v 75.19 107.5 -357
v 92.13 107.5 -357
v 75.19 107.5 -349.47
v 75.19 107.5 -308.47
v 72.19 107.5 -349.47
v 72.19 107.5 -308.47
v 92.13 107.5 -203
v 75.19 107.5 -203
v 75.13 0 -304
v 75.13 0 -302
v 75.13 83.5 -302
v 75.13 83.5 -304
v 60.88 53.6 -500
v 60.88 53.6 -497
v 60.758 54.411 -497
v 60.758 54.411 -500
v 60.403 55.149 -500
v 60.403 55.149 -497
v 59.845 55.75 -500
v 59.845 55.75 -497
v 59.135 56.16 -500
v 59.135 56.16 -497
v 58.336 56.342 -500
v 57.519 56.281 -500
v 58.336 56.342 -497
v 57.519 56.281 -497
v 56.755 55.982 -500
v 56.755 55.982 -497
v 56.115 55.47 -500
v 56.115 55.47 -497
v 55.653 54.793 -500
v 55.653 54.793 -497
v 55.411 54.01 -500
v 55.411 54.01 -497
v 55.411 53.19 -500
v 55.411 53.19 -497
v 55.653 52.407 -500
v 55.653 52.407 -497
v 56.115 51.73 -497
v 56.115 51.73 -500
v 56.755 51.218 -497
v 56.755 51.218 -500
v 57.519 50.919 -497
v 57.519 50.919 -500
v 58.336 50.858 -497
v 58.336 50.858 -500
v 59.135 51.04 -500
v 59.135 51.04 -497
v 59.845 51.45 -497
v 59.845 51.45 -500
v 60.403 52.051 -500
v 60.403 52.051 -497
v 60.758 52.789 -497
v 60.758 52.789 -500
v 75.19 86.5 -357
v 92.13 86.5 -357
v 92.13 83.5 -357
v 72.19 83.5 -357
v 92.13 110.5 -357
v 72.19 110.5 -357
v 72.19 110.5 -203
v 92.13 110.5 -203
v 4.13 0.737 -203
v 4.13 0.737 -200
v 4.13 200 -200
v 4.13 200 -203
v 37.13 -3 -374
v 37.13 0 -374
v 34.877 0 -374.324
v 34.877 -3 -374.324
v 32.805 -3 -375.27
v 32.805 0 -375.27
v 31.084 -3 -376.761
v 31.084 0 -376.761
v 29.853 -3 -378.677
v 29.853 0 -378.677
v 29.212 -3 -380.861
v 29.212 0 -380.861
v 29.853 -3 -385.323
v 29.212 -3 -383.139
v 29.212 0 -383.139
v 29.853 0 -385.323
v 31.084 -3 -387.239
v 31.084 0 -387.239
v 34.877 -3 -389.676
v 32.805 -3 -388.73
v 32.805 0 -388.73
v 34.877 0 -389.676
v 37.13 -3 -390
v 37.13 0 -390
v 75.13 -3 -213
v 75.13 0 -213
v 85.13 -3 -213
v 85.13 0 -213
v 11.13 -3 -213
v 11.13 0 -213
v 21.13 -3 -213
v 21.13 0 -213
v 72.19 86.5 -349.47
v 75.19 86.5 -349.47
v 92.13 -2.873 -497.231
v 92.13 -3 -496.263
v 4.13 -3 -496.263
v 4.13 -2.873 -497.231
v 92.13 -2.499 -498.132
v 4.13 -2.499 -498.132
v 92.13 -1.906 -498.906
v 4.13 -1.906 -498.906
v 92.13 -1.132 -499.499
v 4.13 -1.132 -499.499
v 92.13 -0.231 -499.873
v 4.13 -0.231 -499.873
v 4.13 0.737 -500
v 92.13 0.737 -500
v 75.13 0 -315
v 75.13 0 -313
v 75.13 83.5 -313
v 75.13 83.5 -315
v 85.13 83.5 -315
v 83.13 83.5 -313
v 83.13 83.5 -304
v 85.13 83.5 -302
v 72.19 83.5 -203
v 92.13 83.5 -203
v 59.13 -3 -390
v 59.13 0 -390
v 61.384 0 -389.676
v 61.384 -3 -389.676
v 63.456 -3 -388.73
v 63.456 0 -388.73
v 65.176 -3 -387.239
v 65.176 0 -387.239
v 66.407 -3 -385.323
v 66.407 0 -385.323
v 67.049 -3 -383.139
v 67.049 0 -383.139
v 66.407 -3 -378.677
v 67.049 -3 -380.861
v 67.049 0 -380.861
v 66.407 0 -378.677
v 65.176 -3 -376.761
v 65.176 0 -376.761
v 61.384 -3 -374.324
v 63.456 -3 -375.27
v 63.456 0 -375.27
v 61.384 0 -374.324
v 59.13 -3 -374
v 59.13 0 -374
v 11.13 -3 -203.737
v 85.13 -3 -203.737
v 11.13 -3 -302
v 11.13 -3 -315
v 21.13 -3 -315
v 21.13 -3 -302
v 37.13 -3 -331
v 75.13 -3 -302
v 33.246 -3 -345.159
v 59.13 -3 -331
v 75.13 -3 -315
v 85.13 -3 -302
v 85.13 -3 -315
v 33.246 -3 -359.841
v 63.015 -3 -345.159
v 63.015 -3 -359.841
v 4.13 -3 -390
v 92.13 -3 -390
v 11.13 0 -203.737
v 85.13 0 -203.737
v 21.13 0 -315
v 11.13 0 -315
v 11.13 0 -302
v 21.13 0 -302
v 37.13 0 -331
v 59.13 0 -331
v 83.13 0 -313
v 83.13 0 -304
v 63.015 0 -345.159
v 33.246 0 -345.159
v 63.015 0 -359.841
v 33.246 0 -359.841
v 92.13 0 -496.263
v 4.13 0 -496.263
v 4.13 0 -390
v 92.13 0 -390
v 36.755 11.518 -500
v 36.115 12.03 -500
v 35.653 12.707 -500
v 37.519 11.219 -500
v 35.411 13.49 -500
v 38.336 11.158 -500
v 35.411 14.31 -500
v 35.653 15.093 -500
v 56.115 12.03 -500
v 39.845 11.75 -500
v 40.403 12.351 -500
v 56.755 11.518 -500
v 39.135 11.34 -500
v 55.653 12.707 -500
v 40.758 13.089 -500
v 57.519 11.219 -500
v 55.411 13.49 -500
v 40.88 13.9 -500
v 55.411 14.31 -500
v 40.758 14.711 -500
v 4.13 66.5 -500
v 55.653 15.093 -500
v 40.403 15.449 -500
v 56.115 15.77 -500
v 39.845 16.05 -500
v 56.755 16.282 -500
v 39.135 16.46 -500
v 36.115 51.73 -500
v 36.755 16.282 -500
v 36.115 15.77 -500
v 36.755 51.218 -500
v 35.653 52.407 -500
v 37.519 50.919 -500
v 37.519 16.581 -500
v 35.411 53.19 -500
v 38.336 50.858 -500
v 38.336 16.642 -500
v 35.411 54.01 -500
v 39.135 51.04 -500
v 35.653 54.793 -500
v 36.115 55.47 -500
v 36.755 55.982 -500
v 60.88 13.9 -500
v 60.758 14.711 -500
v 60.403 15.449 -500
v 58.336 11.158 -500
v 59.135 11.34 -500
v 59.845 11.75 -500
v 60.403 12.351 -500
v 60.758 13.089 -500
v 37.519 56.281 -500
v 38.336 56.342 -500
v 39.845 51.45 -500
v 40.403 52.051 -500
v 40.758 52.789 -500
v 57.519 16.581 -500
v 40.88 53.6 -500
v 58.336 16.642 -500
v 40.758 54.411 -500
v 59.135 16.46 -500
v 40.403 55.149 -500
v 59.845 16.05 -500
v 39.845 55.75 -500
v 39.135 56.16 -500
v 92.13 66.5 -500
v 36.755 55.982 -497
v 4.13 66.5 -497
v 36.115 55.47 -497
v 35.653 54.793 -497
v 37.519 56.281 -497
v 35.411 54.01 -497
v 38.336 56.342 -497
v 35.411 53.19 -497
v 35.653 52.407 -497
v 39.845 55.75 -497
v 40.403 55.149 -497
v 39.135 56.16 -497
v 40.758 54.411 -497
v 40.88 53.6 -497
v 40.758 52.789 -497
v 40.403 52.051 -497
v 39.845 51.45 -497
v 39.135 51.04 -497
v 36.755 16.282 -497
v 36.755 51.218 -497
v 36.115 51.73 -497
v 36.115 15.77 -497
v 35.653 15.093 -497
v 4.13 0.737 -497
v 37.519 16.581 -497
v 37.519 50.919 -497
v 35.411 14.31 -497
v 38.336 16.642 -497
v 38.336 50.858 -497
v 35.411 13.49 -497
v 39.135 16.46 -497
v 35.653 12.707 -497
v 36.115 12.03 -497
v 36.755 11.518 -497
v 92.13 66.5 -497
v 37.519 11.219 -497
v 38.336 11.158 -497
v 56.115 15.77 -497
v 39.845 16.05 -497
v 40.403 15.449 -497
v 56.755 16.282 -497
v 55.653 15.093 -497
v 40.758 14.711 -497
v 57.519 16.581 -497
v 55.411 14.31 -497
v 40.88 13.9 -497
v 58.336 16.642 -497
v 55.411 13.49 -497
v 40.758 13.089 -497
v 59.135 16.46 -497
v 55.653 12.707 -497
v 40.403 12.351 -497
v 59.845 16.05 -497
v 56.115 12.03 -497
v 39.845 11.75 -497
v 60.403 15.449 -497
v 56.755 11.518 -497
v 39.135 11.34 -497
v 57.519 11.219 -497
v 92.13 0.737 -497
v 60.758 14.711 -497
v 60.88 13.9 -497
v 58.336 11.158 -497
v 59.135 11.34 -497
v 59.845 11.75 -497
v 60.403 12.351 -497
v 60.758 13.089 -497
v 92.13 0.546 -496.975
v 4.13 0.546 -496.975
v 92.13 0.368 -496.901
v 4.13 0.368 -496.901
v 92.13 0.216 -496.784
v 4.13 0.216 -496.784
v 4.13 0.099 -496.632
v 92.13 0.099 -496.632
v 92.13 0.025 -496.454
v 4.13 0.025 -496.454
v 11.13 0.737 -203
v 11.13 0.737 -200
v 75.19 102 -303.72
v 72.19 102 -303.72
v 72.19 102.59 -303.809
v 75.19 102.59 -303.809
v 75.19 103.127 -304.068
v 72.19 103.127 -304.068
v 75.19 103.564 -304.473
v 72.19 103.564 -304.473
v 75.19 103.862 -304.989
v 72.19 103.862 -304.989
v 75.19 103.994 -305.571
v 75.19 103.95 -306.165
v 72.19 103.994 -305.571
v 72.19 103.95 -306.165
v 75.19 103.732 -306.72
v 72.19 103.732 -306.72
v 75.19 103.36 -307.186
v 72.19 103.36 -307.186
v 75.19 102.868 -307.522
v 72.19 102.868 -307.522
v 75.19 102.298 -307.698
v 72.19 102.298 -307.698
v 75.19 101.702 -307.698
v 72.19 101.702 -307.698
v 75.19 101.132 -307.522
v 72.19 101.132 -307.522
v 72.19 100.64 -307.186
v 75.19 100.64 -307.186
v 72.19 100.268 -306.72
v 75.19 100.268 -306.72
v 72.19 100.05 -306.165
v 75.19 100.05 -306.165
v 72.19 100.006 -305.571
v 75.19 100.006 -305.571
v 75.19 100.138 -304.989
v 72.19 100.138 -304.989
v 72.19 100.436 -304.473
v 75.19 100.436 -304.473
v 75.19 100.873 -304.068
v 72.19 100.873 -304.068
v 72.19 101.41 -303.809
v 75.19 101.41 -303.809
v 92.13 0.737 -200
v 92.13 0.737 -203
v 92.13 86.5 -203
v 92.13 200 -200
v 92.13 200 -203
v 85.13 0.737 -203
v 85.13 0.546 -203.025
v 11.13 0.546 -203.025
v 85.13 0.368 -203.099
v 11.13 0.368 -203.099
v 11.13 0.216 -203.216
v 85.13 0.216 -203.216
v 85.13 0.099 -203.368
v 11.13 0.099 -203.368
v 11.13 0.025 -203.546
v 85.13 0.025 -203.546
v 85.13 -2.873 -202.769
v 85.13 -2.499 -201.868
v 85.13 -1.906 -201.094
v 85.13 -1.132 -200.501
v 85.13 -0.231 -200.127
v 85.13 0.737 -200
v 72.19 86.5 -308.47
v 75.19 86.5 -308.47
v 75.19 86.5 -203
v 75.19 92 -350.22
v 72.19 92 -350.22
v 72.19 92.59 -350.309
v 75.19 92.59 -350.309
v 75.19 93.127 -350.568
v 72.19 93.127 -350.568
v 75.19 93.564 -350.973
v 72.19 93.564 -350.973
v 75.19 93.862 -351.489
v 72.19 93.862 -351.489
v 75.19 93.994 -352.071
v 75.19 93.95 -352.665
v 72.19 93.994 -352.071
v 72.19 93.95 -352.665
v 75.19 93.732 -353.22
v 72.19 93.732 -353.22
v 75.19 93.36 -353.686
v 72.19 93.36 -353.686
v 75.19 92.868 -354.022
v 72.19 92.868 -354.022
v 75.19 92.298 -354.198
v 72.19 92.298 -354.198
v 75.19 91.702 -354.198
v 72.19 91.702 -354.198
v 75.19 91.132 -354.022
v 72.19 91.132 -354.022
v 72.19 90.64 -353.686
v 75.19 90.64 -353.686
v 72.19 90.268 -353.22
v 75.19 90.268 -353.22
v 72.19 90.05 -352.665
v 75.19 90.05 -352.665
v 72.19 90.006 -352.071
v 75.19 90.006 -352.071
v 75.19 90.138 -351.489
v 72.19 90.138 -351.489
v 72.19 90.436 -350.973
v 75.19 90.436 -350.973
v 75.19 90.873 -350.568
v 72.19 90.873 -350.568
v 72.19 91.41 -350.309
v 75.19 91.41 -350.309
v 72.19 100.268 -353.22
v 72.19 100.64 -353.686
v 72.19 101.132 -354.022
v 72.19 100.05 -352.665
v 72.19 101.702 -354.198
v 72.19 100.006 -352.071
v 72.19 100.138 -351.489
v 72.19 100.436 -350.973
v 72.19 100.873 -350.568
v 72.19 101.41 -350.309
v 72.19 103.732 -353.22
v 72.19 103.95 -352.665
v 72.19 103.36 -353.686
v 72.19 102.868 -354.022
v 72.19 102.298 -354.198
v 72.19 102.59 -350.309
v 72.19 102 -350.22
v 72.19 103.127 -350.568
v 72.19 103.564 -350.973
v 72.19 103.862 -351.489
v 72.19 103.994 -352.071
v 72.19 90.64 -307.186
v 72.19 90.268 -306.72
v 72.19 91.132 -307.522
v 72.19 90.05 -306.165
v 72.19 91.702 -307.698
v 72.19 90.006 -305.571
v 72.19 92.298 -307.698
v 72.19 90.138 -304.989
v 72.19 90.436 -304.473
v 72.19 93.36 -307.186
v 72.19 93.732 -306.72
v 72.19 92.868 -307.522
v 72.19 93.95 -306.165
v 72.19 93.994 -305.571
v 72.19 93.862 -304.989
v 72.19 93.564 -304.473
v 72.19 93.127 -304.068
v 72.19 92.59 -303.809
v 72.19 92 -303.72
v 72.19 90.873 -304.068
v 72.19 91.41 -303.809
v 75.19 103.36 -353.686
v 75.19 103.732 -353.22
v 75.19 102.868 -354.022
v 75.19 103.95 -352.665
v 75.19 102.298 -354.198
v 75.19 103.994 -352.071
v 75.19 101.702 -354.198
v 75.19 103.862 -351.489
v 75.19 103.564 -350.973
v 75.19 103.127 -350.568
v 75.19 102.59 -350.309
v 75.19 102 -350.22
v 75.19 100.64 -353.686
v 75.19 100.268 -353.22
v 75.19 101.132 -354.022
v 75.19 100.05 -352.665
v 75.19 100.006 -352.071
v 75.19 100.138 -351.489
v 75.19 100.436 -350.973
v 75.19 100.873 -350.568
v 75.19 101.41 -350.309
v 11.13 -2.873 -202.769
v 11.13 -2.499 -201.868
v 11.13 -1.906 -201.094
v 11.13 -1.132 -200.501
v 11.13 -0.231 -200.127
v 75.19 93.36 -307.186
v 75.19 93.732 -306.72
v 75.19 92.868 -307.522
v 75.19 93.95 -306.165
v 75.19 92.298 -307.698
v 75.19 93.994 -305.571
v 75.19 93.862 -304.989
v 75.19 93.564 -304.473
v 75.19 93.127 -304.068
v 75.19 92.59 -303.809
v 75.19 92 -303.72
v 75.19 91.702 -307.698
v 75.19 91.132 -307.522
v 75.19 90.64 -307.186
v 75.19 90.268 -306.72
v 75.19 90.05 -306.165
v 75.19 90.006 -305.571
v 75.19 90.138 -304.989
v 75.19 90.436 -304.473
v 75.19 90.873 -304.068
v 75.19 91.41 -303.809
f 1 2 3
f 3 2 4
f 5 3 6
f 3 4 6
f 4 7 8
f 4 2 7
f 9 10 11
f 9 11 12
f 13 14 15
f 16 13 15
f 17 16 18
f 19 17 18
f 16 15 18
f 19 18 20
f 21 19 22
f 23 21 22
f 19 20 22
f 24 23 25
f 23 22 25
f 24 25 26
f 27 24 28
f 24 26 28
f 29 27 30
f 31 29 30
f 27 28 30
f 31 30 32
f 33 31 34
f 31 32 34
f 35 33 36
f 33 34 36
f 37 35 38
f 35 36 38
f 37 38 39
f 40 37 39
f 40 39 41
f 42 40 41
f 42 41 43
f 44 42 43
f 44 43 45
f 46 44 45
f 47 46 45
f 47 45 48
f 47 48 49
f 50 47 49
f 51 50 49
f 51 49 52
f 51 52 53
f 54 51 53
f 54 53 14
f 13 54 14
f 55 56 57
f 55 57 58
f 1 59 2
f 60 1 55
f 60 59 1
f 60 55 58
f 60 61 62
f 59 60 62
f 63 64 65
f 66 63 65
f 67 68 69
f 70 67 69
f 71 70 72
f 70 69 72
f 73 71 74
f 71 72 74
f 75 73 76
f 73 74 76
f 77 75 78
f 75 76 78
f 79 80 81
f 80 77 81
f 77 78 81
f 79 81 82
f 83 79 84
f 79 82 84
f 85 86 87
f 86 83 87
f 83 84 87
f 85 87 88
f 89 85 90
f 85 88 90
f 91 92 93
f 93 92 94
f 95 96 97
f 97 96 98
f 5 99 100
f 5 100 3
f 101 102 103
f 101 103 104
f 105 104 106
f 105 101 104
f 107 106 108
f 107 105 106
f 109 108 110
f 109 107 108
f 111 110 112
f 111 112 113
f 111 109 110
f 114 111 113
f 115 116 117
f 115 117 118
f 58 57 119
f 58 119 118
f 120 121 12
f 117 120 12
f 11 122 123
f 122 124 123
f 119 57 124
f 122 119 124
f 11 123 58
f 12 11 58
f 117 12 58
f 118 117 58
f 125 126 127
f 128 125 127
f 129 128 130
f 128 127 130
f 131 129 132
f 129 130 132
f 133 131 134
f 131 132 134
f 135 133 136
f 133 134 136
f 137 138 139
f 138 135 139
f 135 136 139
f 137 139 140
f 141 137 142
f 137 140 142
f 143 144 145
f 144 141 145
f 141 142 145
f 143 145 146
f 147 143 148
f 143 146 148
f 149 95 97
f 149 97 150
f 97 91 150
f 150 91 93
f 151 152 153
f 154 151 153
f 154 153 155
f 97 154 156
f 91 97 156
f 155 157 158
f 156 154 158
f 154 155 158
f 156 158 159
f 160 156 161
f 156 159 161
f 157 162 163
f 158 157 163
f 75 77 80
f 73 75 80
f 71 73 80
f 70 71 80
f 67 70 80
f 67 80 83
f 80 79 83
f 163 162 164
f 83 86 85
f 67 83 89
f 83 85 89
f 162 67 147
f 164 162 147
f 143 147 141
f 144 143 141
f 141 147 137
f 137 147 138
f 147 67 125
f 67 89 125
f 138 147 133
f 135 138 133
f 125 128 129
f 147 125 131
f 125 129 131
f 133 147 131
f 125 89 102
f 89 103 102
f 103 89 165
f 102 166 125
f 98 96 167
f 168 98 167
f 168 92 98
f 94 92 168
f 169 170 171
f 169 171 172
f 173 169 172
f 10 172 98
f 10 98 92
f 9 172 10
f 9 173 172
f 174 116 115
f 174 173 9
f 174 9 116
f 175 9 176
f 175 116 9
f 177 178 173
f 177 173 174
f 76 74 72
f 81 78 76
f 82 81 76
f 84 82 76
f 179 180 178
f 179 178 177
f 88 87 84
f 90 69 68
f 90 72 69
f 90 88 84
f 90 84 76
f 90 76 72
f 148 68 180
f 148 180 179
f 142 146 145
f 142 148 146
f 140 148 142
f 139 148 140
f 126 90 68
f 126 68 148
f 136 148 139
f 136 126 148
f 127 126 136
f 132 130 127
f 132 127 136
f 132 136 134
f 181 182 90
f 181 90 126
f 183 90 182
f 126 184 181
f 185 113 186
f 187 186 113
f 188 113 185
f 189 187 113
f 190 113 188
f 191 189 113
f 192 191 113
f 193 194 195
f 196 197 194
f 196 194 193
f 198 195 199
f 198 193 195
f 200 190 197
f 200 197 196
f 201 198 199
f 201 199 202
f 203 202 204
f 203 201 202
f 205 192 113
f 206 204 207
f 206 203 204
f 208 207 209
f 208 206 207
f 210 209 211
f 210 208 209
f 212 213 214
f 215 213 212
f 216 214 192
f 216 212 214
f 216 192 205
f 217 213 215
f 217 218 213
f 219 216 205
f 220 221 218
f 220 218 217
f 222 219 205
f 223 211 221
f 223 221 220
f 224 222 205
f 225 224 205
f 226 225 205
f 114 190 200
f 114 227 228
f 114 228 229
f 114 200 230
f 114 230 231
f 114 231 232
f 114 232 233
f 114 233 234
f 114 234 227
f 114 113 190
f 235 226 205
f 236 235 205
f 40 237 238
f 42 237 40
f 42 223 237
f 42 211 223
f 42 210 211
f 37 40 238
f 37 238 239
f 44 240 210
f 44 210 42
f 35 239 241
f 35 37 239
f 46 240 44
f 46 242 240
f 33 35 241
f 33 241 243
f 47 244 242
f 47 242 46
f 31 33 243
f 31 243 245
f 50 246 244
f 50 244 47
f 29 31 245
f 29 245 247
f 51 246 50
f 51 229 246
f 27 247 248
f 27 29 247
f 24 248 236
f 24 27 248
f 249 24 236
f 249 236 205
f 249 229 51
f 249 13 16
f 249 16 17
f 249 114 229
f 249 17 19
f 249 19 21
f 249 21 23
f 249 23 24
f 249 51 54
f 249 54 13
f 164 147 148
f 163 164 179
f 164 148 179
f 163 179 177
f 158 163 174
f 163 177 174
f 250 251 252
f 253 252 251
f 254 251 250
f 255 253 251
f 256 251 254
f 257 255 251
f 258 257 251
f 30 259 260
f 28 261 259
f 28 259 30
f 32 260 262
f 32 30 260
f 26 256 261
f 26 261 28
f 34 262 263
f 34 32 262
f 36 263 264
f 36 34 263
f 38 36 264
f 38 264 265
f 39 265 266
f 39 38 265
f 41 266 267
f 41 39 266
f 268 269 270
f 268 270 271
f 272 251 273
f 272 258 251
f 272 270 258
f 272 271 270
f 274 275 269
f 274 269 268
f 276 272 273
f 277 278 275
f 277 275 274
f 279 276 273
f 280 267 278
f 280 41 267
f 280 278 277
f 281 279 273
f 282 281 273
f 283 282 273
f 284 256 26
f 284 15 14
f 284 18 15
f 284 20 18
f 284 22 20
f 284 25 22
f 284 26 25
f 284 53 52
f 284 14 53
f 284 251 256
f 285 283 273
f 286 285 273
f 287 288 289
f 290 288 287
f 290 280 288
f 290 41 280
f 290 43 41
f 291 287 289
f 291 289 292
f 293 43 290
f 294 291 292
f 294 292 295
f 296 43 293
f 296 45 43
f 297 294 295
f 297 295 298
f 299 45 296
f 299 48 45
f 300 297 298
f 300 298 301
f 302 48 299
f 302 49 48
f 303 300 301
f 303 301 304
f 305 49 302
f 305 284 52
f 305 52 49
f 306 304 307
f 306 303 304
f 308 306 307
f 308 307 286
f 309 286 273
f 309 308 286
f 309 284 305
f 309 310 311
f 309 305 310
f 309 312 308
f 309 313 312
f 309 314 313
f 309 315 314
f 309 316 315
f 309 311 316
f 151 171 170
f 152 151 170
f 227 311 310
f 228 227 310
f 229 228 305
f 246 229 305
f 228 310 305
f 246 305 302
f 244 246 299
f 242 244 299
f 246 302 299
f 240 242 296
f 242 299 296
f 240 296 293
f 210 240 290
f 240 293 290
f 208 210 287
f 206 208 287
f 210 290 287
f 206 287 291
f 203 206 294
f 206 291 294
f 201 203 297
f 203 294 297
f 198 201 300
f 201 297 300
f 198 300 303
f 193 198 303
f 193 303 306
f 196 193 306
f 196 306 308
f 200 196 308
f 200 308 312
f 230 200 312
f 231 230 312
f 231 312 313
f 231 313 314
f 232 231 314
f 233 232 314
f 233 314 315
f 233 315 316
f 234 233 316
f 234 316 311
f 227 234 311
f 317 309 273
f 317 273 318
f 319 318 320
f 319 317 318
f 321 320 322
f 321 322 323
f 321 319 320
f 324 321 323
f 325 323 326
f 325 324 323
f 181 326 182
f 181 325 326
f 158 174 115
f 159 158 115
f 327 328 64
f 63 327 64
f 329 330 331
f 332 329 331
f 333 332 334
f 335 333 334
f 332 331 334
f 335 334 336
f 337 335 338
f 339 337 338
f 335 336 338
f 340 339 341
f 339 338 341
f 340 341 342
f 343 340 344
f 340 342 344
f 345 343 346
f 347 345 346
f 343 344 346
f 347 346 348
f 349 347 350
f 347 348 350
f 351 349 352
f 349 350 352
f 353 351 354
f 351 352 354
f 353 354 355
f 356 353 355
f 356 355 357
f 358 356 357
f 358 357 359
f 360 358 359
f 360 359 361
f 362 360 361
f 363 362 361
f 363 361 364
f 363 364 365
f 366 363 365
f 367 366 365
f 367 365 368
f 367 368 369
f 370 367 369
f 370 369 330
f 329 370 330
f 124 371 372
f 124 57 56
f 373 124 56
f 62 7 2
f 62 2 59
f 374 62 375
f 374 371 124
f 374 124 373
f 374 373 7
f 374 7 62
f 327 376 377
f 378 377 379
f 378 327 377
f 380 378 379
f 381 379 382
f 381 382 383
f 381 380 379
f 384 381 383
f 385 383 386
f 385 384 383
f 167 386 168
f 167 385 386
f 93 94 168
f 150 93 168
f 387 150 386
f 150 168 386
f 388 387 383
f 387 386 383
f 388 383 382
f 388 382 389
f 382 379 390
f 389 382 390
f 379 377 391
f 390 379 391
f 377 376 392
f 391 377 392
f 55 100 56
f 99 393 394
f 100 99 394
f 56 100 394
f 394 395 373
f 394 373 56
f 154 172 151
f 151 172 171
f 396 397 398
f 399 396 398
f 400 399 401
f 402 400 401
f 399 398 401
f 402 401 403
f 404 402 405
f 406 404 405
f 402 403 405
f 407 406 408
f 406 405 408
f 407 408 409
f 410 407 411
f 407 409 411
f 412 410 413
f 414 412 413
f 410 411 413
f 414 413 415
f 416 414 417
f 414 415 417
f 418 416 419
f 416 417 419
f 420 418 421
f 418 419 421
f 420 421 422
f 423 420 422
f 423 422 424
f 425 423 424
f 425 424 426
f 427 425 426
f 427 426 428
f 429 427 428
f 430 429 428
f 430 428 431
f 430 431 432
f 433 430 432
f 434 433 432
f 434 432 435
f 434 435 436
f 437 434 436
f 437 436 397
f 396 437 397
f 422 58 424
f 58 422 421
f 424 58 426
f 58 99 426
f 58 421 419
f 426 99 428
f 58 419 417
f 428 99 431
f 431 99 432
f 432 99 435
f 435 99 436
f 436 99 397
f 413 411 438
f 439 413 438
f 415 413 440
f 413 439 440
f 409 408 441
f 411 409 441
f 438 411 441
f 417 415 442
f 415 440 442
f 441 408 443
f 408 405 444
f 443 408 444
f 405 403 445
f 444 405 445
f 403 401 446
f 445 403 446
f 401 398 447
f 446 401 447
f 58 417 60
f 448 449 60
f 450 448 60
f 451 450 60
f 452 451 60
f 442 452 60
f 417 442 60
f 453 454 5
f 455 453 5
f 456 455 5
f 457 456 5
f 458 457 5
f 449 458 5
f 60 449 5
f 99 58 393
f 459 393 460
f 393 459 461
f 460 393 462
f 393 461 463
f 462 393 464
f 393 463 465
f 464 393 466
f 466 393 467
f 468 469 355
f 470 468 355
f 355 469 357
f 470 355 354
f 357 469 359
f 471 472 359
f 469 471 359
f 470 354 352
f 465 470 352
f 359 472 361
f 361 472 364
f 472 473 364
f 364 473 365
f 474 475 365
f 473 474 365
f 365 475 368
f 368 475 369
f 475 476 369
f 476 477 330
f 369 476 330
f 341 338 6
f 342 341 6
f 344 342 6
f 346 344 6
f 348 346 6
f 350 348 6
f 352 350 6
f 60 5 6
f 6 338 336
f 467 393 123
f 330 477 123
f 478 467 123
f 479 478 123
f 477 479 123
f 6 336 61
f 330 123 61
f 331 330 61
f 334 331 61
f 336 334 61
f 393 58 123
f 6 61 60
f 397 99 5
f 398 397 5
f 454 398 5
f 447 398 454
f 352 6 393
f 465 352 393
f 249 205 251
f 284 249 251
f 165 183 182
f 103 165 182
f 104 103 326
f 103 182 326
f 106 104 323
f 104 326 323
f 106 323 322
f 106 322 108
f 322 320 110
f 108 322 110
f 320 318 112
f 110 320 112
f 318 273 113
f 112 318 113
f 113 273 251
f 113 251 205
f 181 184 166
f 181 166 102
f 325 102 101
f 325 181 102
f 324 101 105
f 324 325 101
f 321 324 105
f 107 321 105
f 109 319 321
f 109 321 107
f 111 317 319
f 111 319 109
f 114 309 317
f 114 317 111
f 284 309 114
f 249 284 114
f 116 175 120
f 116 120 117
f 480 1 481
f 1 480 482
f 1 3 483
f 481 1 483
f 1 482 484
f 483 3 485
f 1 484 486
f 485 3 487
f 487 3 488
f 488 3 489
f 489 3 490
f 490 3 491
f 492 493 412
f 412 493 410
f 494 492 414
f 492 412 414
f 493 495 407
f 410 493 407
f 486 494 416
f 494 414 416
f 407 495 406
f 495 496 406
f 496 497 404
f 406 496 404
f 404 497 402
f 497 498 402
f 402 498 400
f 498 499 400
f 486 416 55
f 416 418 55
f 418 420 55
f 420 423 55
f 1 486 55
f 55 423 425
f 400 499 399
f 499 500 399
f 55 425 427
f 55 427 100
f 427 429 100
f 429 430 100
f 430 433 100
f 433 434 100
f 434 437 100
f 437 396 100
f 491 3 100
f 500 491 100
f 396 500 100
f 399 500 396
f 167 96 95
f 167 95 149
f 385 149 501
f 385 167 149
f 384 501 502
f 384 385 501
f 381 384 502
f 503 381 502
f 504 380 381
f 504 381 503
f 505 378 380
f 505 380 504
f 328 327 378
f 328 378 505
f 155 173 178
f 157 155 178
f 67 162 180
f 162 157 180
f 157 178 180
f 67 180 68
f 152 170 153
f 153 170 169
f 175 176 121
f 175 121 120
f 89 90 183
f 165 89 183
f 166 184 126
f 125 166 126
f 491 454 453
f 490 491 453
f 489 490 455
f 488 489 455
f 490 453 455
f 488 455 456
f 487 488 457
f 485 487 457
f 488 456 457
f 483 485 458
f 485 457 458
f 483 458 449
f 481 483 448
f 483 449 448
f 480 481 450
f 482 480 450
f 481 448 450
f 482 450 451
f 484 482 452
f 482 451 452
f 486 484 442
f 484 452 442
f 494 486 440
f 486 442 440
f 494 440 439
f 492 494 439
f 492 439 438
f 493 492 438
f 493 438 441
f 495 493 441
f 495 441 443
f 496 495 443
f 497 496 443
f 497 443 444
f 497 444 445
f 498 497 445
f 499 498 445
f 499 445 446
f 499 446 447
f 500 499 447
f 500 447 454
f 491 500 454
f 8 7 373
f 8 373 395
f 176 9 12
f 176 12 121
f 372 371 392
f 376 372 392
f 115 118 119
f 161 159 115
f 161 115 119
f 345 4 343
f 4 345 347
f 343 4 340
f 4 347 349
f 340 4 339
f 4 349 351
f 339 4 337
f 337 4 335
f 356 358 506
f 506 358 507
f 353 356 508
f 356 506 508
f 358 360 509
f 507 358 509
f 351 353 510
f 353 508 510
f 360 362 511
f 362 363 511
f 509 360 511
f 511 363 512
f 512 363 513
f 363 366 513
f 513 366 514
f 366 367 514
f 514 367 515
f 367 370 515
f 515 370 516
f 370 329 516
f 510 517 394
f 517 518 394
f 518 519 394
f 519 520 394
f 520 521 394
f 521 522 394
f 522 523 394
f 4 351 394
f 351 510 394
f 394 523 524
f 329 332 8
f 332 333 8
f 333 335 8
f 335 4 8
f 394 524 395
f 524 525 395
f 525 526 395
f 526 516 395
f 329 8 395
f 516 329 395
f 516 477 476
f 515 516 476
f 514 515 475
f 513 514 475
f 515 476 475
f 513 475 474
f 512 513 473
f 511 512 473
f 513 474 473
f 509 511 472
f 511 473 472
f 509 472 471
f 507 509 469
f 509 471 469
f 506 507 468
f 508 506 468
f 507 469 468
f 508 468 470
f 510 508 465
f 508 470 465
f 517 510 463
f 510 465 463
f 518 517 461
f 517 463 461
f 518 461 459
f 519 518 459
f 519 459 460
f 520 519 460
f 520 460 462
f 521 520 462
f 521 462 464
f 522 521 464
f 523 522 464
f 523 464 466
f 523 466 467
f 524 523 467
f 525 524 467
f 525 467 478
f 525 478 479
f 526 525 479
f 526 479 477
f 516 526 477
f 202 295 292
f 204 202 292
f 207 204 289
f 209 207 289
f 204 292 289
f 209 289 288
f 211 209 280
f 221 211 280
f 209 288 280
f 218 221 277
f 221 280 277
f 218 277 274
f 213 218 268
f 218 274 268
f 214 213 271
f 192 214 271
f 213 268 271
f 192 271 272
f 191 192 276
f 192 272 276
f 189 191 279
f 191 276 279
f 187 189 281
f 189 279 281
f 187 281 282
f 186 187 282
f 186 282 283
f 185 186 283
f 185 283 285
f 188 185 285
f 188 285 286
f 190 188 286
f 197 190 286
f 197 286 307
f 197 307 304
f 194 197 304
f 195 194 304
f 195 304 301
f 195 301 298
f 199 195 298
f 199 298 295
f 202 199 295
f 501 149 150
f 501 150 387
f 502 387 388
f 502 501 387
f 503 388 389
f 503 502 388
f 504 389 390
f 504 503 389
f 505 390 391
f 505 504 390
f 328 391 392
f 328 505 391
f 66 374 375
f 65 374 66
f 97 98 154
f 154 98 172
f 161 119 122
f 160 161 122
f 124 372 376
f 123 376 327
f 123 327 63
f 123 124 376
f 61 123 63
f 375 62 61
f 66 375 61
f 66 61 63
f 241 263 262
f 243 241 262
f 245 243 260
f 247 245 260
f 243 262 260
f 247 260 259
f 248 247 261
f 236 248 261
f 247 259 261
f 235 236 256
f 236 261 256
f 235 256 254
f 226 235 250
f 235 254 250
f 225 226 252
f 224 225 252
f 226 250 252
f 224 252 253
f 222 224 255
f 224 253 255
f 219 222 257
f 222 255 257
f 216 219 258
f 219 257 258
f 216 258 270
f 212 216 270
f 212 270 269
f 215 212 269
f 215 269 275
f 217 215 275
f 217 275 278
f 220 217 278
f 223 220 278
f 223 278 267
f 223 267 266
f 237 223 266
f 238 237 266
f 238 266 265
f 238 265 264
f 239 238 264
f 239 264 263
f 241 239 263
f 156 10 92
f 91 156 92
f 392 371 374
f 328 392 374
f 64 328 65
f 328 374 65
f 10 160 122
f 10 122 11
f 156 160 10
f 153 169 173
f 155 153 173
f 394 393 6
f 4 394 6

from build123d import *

# Parameters (mm, degrees)
BASE_FLANGE1_START                    = -3
BASE_FLANGE1_OUTLINE_W                = 88
BASE_FLANGE1_OUTLINE_H                = 300
BASE_FLANGE1_DEPTH                    = 3
CUT_EXTRUDE2_DEPTH                    = 509.426019398
CUT_EXTRUDE2_DEPTH_BACK               = 3
SKETCH14_OUTSIDE_W                    = 152.53
SKETCH14_OUTSIDE_H                    = 364.53
T_LE_PLI_E_SUR_AR_TE2_STRIP_W         = 13.4732
T_LE_PLI_E_SUR_AR_TE2_STRIP_H         = 3
T_LE_PLI_E_SUR_AR_TE2_STRIP_CUT_DEPTH = 88
T_LE_PLI_E_SUR_AR_TE2_DEPTH           = 88
D_GAGEMENT_M51_D                      = 5.5
T_LE_PLI_E_SUR_AR_TE3_STRIP_W         = 13.4732
T_LE_PLI_E_SUR_AR_TE3_STRIP_H         = 3
T_LE_PLI_E_SUR_AR_TE3_STRIP_CUT_DEPTH = 74
T_LE_PLI_E_SUR_AR_TE3_DEPTH           = 74
T_LE_PLI_E_SUR_AR_TE3_PROFILE_W       = 88
T_LE_PLI_E_SUR_AR_TE3_PROFILE_H       = 199.2634
T_LE_PLI_E_SUR_AR_TE3_FLAT_DEPTH      = 3
BOSS_EXTRUDE2_DEPTH                   = 154
CUT_EXTRUDE3_REACH                    = 544.8
SKETCH48_W                            = 41
SKETCH48_H                            = 21
BOSS_EXTRUDE3_REACH                   = 548.341
CUT_EXTRUDE4_REACH                    = 544.8
SKETCH50_R                            = 2


# Read off the part's stored shape, not the designer's step: Base-Flange1
# Sheet-metal steps are written as plain solids
with BuildPart() as part:
    # Base-Flange1 outline → Base-Flange1 (new body)
    with BuildSketch(Plane(origin=(0, 0, 0), x_dir=(1, 0, 0), z_dir=(0, 1, 0)).offset(BASE_FLANGE1_START)):
        with Locations((48.130435799, 350)):
            Rectangle(BASE_FLANGE1_OUTLINE_W, BASE_FLANGE1_OUTLINE_H)
    extrude(amount=BASE_FLANGE1_DEPTH)

    # Sketch14 outside → Cut-Extrude2 (cut, two sides: drawn at the far end of the back side and taken through both)
    with BuildSketch(Plane.XZ.offset(3).offset(-CUT_EXTRUDE2_DEPTH_BACK)):
        with Locations((48.13, -350)):
            Rectangle(SKETCH14_OUTSIDE_W, SKETCH14_OUTSIDE_H)
        with BuildLine():
            Line((85.130435799, -200), (11.130435799, -200))
            Line((11.130435799, -200), (11.130435799, -213))
            Line((11.130435799, -213), (21.130435799, -213))
            Line((21.130435799, -213), (21.130435799, -302))
            Line((21.130435799, -302), (11.130435799, -302))
            Line((11.130435799, -302), (11.130435799, -315))
            Line((11.130435799, -315), (21.130435799, -315))
            Line((21.130435799, -315), (37.130435799, -331))
            ThreePointArc((37.130435799, -331), (32.754046891, -352.5), (37.130435799, -374))
            ThreePointArc((37.130435799, -374), (29.130435799, -382), (37.130435799, -390))
            Line((37.130435799, -390), (4.130435799, -390))
            Line((4.130435799, -390), (4.130435799, -500))
            Line((4.130435799, -500), (92.130435799, -500))
            Line((92.130435799, -500), (92.130435799, -390))
            Line((92.130435799, -390), (59.130435799, -390))
            ThreePointArc((59.130435799, -390), (67.130435799, -382), (59.130435799, -374))
            ThreePointArc((59.130435799, -374), (63.506824707, -352.5), (59.130435799, -331))
            Line((59.130435799, -331), (75.130435799, -315))
            Line((75.130435799, -315), (85.130435799, -315))
            Line((85.130435799, -315), (85.130435799, -302))
            Line((85.130435799, -302), (75.130435799, -302))
            Line((75.130435799, -302), (75.130435799, -213))
            Line((75.130435799, -213), (85.130435799, -213))
            Line((85.130435799, -213), (85.130435799, -200))
        make_face(mode=Mode.SUBTRACT)
    extrude(amount=CUT_EXTRUDE2_DEPTH + CUT_EXTRUDE2_DEPTH_BACK, mode=Mode.SUBTRACT)

    # Tôle pliée sur arête2 strip (across the edge) → Tôle pliée sur arête2 strip cut (cut)
    with BuildSketch(Plane(origin=(92.130435799, 0, -500), x_dir=(0, 0, 1), z_dir=(-1, 0, 0))):
        with Locations((-3, -1.5)):
            Rectangle(T_LE_PLI_E_SUR_AR_TE2_STRIP_W, T_LE_PLI_E_SUR_AR_TE2_STRIP_H)
    extrude(amount=T_LE_PLI_E_SUR_AR_TE2_STRIP_CUT_DEPTH, mode=Mode.SUBTRACT)

    # Tôle pliée sur arête2 section (across the edge) → Tôle pliée sur arête2 (add)
    with BuildSketch(Plane(origin=(92.130435799, 0, -500), x_dir=(0, 0, 1), z_dir=(-1, 0, 0))):
        with BuildLine():
            Line((0, 0.7366), (0, 66.5))
            Line((0, 66.5), (3, 66.5))
            Line((3, 66.5), (3, 0.7366))
            ThreePointArc((3, 0.7366), (3.215745145, 0.215745145), (3.7366, 0))
            Line((3.7366, 0), (3.7366, -3))
            ThreePointArc((3.7366, -3), (1.094424801, -1.905575199), (0, 0.7366))
        make_face()
    extrude(amount=T_LE_PLI_E_SUR_AR_TE2_DEPTH)

    # Dégagement M51 (through all)
    with Locations(Plane(origin=(58.130435799, 53.6, -500), x_dir=(-1, 0, 0), z_dir=(0, 0, -1))):
        with Locations((0, 0), (20, 0), (0, -39.7), (20, -39.7)):
            Hole(D_GAGEMENT_M51_D / 2)

    # Tôle pliée sur arête3 strip (across the edge) → Tôle pliée sur arête3 strip cut (cut)
    with BuildSketch(Plane(origin=(11.130435799, 0, -200), x_dir=(0, 0, -1), z_dir=(1, 0, 0))):
        with Locations((-3, -1.5)):
            Rectangle(T_LE_PLI_E_SUR_AR_TE3_STRIP_W, T_LE_PLI_E_SUR_AR_TE3_STRIP_H)
    extrude(amount=T_LE_PLI_E_SUR_AR_TE3_STRIP_CUT_DEPTH, mode=Mode.SUBTRACT)

    # Tôle pliée sur arête3 bend section (across the edge) → Tôle pliée sur arête3 (add)
    with BuildSketch(Plane(origin=(11.130435799, 0, -200), x_dir=(0, 0, -1), z_dir=(1, 0, 0))):
        with BuildLine():
            Line((0, 0.7366), (3, 0.7366))
            ThreePointArc((3, 0.7366), (3.215745145, 0.215745145), (3.7366, 0))
            Line((3.7366, 0), (3.7366, -3))
            ThreePointArc((3.7366, -3), (1.094424801, -1.905575199), (0, 0.7366))
        make_face()
    extrude(amount=T_LE_PLI_E_SUR_AR_TE3_DEPTH)

    # Tôle pliée sur arête3 profile (on flange) → Tôle pliée sur arête3 flat (add)
    with BuildSketch(Plane(origin=(0, 0, -200), x_dir=(-1, 0, 0), z_dir=(0, 0, -1))):
        with Locations((-48.130435799, 100.3683)):
            Rectangle(T_LE_PLI_E_SUR_AR_TE3_PROFILE_W, T_LE_PLI_E_SUR_AR_TE3_PROFILE_H)
    extrude(amount=T_LE_PLI_E_SUR_AR_TE3_FLAT_DEPTH)

    # Sketch47 → Boss-Extrude2 (add)
    with BuildSketch(Plane(origin=(0, 0, -203), x_dir=(-1, 0, 0), z_dir=(0, 0, -1))):
        Polygon((-72.190435799, 83.5), (-72.190435799, 110.5), (-92.130435799, 110.5), (-92.130435799, 107.5), (-75.190435799, 107.5), (-75.190435799, 86.5), (-92.130435799, 86.5), (-92.130435799, 83.5), align=None)
    extrude(amount=BOSS_EXTRUDE2_DEPTH)

    # Sketch48 → Cut-Extrude3 (cut, up to next)
    with BuildSketch(Plane.ZY.offset(-72.190435799), mode=Mode.PRIVATE) as cut_extrude3_sk1:
        with Locations((-328.97, 97)):
            Rectangle(SKETCH48_W, SKETCH48_H)
    cut_extrude3_tool1 = extrude(cut_extrude3_sk1.sketch, amount=-CUT_EXTRUDE3_REACH, mode=Mode.PRIVATE) & part.part
    add(cut_extrude3_tool1.solids().sort_by_distance((72.190436, 97, -328.97))[0], mode=Mode.SUBTRACT)

    # Sketch49 → Boss-Extrude3 (add, up to next)
    with BuildSketch(Plane(origin=(0, 0, 0), x_dir=(1, 0, 0), z_dir=(0, 1, 0)), mode=Mode.PRIVATE) as boss_extrude3_sk1:
        Polygon((75.130435799, 315), (85.130435799, 315), (85.130435799, 302), (75.130435799, 302), (75.130435799, 304), (83.130435799, 304), (83.130435799, 313), (75.130435799, 313), align=None)
    boss_extrude3_tool1 = extrude(boss_extrude3_sk1.sketch, amount=BOSS_EXTRUDE3_REACH, mode=Mode.PRIVATE) - part.part
    add(boss_extrude3_tool1.solids().sort_by_distance((80.130436, 0, -314.835988))[0])

    # Sketch50 → Cut-Extrude4 (cut, up to next)
    with BuildSketch(Plane.ZY.offset(-72.190435799), mode=Mode.PRIVATE) as cut_extrude4_sk1:
        with Locations((-352.22, 102)):
            Circle(SKETCH50_R)
    cut_extrude4_tool1 = extrude(cut_extrude4_sk1.sketch, amount=-CUT_EXTRUDE4_REACH, mode=Mode.PRIVATE) & part.part
    # Sketch50 → Cut-Extrude4 (cut, up to next)
    with BuildSketch(Plane.ZY.offset(-72.190435799), mode=Mode.PRIVATE) as cut_extrude4_sk2:
        with Locations((-352.22, 92)):
            Circle(SKETCH50_R)
    cut_extrude4_tool2 = extrude(cut_extrude4_sk2.sketch, amount=-CUT_EXTRUDE4_REACH, mode=Mode.PRIVATE) & part.part
    # Sketch50 → Cut-Extrude4 (cut, up to next)
    with BuildSketch(Plane.ZY.offset(-72.190435799), mode=Mode.PRIVATE) as cut_extrude4_sk3:
        with Locations((-305.72, 102)):
            Circle(SKETCH50_R)
    cut_extrude4_tool3 = extrude(cut_extrude4_sk3.sketch, amount=-CUT_EXTRUDE4_REACH, mode=Mode.PRIVATE) & part.part
    # Sketch50 → Cut-Extrude4 (cut, up to next)
    with BuildSketch(Plane.ZY.offset(-72.190435799), mode=Mode.PRIVATE) as cut_extrude4_sk4:
        with Locations((-305.72, 92)):
            Circle(SKETCH50_R)
    cut_extrude4_tool4 = extrude(cut_extrude4_sk4.sketch, amount=-CUT_EXTRUDE4_REACH, mode=Mode.PRIVATE) & part.part
    add(cut_extrude4_tool1.solids().sort_by_distance((72.190436, 102, -352.22))[0], mode=Mode.SUBTRACT)
    add(cut_extrude4_tool2.solids().sort_by_distance((72.190436, 92, -352.22))[0], mode=Mode.SUBTRACT)
    add(cut_extrude4_tool3.solids().sort_by_distance((72.190436, 102, -305.72))[0], mode=Mode.SUBTRACT)
    add(cut_extrude4_tool4.solids().sort_by_distance((72.190436, 92, -305.72))[0], mode=Mode.SUBTRACT)


solid = part.part
